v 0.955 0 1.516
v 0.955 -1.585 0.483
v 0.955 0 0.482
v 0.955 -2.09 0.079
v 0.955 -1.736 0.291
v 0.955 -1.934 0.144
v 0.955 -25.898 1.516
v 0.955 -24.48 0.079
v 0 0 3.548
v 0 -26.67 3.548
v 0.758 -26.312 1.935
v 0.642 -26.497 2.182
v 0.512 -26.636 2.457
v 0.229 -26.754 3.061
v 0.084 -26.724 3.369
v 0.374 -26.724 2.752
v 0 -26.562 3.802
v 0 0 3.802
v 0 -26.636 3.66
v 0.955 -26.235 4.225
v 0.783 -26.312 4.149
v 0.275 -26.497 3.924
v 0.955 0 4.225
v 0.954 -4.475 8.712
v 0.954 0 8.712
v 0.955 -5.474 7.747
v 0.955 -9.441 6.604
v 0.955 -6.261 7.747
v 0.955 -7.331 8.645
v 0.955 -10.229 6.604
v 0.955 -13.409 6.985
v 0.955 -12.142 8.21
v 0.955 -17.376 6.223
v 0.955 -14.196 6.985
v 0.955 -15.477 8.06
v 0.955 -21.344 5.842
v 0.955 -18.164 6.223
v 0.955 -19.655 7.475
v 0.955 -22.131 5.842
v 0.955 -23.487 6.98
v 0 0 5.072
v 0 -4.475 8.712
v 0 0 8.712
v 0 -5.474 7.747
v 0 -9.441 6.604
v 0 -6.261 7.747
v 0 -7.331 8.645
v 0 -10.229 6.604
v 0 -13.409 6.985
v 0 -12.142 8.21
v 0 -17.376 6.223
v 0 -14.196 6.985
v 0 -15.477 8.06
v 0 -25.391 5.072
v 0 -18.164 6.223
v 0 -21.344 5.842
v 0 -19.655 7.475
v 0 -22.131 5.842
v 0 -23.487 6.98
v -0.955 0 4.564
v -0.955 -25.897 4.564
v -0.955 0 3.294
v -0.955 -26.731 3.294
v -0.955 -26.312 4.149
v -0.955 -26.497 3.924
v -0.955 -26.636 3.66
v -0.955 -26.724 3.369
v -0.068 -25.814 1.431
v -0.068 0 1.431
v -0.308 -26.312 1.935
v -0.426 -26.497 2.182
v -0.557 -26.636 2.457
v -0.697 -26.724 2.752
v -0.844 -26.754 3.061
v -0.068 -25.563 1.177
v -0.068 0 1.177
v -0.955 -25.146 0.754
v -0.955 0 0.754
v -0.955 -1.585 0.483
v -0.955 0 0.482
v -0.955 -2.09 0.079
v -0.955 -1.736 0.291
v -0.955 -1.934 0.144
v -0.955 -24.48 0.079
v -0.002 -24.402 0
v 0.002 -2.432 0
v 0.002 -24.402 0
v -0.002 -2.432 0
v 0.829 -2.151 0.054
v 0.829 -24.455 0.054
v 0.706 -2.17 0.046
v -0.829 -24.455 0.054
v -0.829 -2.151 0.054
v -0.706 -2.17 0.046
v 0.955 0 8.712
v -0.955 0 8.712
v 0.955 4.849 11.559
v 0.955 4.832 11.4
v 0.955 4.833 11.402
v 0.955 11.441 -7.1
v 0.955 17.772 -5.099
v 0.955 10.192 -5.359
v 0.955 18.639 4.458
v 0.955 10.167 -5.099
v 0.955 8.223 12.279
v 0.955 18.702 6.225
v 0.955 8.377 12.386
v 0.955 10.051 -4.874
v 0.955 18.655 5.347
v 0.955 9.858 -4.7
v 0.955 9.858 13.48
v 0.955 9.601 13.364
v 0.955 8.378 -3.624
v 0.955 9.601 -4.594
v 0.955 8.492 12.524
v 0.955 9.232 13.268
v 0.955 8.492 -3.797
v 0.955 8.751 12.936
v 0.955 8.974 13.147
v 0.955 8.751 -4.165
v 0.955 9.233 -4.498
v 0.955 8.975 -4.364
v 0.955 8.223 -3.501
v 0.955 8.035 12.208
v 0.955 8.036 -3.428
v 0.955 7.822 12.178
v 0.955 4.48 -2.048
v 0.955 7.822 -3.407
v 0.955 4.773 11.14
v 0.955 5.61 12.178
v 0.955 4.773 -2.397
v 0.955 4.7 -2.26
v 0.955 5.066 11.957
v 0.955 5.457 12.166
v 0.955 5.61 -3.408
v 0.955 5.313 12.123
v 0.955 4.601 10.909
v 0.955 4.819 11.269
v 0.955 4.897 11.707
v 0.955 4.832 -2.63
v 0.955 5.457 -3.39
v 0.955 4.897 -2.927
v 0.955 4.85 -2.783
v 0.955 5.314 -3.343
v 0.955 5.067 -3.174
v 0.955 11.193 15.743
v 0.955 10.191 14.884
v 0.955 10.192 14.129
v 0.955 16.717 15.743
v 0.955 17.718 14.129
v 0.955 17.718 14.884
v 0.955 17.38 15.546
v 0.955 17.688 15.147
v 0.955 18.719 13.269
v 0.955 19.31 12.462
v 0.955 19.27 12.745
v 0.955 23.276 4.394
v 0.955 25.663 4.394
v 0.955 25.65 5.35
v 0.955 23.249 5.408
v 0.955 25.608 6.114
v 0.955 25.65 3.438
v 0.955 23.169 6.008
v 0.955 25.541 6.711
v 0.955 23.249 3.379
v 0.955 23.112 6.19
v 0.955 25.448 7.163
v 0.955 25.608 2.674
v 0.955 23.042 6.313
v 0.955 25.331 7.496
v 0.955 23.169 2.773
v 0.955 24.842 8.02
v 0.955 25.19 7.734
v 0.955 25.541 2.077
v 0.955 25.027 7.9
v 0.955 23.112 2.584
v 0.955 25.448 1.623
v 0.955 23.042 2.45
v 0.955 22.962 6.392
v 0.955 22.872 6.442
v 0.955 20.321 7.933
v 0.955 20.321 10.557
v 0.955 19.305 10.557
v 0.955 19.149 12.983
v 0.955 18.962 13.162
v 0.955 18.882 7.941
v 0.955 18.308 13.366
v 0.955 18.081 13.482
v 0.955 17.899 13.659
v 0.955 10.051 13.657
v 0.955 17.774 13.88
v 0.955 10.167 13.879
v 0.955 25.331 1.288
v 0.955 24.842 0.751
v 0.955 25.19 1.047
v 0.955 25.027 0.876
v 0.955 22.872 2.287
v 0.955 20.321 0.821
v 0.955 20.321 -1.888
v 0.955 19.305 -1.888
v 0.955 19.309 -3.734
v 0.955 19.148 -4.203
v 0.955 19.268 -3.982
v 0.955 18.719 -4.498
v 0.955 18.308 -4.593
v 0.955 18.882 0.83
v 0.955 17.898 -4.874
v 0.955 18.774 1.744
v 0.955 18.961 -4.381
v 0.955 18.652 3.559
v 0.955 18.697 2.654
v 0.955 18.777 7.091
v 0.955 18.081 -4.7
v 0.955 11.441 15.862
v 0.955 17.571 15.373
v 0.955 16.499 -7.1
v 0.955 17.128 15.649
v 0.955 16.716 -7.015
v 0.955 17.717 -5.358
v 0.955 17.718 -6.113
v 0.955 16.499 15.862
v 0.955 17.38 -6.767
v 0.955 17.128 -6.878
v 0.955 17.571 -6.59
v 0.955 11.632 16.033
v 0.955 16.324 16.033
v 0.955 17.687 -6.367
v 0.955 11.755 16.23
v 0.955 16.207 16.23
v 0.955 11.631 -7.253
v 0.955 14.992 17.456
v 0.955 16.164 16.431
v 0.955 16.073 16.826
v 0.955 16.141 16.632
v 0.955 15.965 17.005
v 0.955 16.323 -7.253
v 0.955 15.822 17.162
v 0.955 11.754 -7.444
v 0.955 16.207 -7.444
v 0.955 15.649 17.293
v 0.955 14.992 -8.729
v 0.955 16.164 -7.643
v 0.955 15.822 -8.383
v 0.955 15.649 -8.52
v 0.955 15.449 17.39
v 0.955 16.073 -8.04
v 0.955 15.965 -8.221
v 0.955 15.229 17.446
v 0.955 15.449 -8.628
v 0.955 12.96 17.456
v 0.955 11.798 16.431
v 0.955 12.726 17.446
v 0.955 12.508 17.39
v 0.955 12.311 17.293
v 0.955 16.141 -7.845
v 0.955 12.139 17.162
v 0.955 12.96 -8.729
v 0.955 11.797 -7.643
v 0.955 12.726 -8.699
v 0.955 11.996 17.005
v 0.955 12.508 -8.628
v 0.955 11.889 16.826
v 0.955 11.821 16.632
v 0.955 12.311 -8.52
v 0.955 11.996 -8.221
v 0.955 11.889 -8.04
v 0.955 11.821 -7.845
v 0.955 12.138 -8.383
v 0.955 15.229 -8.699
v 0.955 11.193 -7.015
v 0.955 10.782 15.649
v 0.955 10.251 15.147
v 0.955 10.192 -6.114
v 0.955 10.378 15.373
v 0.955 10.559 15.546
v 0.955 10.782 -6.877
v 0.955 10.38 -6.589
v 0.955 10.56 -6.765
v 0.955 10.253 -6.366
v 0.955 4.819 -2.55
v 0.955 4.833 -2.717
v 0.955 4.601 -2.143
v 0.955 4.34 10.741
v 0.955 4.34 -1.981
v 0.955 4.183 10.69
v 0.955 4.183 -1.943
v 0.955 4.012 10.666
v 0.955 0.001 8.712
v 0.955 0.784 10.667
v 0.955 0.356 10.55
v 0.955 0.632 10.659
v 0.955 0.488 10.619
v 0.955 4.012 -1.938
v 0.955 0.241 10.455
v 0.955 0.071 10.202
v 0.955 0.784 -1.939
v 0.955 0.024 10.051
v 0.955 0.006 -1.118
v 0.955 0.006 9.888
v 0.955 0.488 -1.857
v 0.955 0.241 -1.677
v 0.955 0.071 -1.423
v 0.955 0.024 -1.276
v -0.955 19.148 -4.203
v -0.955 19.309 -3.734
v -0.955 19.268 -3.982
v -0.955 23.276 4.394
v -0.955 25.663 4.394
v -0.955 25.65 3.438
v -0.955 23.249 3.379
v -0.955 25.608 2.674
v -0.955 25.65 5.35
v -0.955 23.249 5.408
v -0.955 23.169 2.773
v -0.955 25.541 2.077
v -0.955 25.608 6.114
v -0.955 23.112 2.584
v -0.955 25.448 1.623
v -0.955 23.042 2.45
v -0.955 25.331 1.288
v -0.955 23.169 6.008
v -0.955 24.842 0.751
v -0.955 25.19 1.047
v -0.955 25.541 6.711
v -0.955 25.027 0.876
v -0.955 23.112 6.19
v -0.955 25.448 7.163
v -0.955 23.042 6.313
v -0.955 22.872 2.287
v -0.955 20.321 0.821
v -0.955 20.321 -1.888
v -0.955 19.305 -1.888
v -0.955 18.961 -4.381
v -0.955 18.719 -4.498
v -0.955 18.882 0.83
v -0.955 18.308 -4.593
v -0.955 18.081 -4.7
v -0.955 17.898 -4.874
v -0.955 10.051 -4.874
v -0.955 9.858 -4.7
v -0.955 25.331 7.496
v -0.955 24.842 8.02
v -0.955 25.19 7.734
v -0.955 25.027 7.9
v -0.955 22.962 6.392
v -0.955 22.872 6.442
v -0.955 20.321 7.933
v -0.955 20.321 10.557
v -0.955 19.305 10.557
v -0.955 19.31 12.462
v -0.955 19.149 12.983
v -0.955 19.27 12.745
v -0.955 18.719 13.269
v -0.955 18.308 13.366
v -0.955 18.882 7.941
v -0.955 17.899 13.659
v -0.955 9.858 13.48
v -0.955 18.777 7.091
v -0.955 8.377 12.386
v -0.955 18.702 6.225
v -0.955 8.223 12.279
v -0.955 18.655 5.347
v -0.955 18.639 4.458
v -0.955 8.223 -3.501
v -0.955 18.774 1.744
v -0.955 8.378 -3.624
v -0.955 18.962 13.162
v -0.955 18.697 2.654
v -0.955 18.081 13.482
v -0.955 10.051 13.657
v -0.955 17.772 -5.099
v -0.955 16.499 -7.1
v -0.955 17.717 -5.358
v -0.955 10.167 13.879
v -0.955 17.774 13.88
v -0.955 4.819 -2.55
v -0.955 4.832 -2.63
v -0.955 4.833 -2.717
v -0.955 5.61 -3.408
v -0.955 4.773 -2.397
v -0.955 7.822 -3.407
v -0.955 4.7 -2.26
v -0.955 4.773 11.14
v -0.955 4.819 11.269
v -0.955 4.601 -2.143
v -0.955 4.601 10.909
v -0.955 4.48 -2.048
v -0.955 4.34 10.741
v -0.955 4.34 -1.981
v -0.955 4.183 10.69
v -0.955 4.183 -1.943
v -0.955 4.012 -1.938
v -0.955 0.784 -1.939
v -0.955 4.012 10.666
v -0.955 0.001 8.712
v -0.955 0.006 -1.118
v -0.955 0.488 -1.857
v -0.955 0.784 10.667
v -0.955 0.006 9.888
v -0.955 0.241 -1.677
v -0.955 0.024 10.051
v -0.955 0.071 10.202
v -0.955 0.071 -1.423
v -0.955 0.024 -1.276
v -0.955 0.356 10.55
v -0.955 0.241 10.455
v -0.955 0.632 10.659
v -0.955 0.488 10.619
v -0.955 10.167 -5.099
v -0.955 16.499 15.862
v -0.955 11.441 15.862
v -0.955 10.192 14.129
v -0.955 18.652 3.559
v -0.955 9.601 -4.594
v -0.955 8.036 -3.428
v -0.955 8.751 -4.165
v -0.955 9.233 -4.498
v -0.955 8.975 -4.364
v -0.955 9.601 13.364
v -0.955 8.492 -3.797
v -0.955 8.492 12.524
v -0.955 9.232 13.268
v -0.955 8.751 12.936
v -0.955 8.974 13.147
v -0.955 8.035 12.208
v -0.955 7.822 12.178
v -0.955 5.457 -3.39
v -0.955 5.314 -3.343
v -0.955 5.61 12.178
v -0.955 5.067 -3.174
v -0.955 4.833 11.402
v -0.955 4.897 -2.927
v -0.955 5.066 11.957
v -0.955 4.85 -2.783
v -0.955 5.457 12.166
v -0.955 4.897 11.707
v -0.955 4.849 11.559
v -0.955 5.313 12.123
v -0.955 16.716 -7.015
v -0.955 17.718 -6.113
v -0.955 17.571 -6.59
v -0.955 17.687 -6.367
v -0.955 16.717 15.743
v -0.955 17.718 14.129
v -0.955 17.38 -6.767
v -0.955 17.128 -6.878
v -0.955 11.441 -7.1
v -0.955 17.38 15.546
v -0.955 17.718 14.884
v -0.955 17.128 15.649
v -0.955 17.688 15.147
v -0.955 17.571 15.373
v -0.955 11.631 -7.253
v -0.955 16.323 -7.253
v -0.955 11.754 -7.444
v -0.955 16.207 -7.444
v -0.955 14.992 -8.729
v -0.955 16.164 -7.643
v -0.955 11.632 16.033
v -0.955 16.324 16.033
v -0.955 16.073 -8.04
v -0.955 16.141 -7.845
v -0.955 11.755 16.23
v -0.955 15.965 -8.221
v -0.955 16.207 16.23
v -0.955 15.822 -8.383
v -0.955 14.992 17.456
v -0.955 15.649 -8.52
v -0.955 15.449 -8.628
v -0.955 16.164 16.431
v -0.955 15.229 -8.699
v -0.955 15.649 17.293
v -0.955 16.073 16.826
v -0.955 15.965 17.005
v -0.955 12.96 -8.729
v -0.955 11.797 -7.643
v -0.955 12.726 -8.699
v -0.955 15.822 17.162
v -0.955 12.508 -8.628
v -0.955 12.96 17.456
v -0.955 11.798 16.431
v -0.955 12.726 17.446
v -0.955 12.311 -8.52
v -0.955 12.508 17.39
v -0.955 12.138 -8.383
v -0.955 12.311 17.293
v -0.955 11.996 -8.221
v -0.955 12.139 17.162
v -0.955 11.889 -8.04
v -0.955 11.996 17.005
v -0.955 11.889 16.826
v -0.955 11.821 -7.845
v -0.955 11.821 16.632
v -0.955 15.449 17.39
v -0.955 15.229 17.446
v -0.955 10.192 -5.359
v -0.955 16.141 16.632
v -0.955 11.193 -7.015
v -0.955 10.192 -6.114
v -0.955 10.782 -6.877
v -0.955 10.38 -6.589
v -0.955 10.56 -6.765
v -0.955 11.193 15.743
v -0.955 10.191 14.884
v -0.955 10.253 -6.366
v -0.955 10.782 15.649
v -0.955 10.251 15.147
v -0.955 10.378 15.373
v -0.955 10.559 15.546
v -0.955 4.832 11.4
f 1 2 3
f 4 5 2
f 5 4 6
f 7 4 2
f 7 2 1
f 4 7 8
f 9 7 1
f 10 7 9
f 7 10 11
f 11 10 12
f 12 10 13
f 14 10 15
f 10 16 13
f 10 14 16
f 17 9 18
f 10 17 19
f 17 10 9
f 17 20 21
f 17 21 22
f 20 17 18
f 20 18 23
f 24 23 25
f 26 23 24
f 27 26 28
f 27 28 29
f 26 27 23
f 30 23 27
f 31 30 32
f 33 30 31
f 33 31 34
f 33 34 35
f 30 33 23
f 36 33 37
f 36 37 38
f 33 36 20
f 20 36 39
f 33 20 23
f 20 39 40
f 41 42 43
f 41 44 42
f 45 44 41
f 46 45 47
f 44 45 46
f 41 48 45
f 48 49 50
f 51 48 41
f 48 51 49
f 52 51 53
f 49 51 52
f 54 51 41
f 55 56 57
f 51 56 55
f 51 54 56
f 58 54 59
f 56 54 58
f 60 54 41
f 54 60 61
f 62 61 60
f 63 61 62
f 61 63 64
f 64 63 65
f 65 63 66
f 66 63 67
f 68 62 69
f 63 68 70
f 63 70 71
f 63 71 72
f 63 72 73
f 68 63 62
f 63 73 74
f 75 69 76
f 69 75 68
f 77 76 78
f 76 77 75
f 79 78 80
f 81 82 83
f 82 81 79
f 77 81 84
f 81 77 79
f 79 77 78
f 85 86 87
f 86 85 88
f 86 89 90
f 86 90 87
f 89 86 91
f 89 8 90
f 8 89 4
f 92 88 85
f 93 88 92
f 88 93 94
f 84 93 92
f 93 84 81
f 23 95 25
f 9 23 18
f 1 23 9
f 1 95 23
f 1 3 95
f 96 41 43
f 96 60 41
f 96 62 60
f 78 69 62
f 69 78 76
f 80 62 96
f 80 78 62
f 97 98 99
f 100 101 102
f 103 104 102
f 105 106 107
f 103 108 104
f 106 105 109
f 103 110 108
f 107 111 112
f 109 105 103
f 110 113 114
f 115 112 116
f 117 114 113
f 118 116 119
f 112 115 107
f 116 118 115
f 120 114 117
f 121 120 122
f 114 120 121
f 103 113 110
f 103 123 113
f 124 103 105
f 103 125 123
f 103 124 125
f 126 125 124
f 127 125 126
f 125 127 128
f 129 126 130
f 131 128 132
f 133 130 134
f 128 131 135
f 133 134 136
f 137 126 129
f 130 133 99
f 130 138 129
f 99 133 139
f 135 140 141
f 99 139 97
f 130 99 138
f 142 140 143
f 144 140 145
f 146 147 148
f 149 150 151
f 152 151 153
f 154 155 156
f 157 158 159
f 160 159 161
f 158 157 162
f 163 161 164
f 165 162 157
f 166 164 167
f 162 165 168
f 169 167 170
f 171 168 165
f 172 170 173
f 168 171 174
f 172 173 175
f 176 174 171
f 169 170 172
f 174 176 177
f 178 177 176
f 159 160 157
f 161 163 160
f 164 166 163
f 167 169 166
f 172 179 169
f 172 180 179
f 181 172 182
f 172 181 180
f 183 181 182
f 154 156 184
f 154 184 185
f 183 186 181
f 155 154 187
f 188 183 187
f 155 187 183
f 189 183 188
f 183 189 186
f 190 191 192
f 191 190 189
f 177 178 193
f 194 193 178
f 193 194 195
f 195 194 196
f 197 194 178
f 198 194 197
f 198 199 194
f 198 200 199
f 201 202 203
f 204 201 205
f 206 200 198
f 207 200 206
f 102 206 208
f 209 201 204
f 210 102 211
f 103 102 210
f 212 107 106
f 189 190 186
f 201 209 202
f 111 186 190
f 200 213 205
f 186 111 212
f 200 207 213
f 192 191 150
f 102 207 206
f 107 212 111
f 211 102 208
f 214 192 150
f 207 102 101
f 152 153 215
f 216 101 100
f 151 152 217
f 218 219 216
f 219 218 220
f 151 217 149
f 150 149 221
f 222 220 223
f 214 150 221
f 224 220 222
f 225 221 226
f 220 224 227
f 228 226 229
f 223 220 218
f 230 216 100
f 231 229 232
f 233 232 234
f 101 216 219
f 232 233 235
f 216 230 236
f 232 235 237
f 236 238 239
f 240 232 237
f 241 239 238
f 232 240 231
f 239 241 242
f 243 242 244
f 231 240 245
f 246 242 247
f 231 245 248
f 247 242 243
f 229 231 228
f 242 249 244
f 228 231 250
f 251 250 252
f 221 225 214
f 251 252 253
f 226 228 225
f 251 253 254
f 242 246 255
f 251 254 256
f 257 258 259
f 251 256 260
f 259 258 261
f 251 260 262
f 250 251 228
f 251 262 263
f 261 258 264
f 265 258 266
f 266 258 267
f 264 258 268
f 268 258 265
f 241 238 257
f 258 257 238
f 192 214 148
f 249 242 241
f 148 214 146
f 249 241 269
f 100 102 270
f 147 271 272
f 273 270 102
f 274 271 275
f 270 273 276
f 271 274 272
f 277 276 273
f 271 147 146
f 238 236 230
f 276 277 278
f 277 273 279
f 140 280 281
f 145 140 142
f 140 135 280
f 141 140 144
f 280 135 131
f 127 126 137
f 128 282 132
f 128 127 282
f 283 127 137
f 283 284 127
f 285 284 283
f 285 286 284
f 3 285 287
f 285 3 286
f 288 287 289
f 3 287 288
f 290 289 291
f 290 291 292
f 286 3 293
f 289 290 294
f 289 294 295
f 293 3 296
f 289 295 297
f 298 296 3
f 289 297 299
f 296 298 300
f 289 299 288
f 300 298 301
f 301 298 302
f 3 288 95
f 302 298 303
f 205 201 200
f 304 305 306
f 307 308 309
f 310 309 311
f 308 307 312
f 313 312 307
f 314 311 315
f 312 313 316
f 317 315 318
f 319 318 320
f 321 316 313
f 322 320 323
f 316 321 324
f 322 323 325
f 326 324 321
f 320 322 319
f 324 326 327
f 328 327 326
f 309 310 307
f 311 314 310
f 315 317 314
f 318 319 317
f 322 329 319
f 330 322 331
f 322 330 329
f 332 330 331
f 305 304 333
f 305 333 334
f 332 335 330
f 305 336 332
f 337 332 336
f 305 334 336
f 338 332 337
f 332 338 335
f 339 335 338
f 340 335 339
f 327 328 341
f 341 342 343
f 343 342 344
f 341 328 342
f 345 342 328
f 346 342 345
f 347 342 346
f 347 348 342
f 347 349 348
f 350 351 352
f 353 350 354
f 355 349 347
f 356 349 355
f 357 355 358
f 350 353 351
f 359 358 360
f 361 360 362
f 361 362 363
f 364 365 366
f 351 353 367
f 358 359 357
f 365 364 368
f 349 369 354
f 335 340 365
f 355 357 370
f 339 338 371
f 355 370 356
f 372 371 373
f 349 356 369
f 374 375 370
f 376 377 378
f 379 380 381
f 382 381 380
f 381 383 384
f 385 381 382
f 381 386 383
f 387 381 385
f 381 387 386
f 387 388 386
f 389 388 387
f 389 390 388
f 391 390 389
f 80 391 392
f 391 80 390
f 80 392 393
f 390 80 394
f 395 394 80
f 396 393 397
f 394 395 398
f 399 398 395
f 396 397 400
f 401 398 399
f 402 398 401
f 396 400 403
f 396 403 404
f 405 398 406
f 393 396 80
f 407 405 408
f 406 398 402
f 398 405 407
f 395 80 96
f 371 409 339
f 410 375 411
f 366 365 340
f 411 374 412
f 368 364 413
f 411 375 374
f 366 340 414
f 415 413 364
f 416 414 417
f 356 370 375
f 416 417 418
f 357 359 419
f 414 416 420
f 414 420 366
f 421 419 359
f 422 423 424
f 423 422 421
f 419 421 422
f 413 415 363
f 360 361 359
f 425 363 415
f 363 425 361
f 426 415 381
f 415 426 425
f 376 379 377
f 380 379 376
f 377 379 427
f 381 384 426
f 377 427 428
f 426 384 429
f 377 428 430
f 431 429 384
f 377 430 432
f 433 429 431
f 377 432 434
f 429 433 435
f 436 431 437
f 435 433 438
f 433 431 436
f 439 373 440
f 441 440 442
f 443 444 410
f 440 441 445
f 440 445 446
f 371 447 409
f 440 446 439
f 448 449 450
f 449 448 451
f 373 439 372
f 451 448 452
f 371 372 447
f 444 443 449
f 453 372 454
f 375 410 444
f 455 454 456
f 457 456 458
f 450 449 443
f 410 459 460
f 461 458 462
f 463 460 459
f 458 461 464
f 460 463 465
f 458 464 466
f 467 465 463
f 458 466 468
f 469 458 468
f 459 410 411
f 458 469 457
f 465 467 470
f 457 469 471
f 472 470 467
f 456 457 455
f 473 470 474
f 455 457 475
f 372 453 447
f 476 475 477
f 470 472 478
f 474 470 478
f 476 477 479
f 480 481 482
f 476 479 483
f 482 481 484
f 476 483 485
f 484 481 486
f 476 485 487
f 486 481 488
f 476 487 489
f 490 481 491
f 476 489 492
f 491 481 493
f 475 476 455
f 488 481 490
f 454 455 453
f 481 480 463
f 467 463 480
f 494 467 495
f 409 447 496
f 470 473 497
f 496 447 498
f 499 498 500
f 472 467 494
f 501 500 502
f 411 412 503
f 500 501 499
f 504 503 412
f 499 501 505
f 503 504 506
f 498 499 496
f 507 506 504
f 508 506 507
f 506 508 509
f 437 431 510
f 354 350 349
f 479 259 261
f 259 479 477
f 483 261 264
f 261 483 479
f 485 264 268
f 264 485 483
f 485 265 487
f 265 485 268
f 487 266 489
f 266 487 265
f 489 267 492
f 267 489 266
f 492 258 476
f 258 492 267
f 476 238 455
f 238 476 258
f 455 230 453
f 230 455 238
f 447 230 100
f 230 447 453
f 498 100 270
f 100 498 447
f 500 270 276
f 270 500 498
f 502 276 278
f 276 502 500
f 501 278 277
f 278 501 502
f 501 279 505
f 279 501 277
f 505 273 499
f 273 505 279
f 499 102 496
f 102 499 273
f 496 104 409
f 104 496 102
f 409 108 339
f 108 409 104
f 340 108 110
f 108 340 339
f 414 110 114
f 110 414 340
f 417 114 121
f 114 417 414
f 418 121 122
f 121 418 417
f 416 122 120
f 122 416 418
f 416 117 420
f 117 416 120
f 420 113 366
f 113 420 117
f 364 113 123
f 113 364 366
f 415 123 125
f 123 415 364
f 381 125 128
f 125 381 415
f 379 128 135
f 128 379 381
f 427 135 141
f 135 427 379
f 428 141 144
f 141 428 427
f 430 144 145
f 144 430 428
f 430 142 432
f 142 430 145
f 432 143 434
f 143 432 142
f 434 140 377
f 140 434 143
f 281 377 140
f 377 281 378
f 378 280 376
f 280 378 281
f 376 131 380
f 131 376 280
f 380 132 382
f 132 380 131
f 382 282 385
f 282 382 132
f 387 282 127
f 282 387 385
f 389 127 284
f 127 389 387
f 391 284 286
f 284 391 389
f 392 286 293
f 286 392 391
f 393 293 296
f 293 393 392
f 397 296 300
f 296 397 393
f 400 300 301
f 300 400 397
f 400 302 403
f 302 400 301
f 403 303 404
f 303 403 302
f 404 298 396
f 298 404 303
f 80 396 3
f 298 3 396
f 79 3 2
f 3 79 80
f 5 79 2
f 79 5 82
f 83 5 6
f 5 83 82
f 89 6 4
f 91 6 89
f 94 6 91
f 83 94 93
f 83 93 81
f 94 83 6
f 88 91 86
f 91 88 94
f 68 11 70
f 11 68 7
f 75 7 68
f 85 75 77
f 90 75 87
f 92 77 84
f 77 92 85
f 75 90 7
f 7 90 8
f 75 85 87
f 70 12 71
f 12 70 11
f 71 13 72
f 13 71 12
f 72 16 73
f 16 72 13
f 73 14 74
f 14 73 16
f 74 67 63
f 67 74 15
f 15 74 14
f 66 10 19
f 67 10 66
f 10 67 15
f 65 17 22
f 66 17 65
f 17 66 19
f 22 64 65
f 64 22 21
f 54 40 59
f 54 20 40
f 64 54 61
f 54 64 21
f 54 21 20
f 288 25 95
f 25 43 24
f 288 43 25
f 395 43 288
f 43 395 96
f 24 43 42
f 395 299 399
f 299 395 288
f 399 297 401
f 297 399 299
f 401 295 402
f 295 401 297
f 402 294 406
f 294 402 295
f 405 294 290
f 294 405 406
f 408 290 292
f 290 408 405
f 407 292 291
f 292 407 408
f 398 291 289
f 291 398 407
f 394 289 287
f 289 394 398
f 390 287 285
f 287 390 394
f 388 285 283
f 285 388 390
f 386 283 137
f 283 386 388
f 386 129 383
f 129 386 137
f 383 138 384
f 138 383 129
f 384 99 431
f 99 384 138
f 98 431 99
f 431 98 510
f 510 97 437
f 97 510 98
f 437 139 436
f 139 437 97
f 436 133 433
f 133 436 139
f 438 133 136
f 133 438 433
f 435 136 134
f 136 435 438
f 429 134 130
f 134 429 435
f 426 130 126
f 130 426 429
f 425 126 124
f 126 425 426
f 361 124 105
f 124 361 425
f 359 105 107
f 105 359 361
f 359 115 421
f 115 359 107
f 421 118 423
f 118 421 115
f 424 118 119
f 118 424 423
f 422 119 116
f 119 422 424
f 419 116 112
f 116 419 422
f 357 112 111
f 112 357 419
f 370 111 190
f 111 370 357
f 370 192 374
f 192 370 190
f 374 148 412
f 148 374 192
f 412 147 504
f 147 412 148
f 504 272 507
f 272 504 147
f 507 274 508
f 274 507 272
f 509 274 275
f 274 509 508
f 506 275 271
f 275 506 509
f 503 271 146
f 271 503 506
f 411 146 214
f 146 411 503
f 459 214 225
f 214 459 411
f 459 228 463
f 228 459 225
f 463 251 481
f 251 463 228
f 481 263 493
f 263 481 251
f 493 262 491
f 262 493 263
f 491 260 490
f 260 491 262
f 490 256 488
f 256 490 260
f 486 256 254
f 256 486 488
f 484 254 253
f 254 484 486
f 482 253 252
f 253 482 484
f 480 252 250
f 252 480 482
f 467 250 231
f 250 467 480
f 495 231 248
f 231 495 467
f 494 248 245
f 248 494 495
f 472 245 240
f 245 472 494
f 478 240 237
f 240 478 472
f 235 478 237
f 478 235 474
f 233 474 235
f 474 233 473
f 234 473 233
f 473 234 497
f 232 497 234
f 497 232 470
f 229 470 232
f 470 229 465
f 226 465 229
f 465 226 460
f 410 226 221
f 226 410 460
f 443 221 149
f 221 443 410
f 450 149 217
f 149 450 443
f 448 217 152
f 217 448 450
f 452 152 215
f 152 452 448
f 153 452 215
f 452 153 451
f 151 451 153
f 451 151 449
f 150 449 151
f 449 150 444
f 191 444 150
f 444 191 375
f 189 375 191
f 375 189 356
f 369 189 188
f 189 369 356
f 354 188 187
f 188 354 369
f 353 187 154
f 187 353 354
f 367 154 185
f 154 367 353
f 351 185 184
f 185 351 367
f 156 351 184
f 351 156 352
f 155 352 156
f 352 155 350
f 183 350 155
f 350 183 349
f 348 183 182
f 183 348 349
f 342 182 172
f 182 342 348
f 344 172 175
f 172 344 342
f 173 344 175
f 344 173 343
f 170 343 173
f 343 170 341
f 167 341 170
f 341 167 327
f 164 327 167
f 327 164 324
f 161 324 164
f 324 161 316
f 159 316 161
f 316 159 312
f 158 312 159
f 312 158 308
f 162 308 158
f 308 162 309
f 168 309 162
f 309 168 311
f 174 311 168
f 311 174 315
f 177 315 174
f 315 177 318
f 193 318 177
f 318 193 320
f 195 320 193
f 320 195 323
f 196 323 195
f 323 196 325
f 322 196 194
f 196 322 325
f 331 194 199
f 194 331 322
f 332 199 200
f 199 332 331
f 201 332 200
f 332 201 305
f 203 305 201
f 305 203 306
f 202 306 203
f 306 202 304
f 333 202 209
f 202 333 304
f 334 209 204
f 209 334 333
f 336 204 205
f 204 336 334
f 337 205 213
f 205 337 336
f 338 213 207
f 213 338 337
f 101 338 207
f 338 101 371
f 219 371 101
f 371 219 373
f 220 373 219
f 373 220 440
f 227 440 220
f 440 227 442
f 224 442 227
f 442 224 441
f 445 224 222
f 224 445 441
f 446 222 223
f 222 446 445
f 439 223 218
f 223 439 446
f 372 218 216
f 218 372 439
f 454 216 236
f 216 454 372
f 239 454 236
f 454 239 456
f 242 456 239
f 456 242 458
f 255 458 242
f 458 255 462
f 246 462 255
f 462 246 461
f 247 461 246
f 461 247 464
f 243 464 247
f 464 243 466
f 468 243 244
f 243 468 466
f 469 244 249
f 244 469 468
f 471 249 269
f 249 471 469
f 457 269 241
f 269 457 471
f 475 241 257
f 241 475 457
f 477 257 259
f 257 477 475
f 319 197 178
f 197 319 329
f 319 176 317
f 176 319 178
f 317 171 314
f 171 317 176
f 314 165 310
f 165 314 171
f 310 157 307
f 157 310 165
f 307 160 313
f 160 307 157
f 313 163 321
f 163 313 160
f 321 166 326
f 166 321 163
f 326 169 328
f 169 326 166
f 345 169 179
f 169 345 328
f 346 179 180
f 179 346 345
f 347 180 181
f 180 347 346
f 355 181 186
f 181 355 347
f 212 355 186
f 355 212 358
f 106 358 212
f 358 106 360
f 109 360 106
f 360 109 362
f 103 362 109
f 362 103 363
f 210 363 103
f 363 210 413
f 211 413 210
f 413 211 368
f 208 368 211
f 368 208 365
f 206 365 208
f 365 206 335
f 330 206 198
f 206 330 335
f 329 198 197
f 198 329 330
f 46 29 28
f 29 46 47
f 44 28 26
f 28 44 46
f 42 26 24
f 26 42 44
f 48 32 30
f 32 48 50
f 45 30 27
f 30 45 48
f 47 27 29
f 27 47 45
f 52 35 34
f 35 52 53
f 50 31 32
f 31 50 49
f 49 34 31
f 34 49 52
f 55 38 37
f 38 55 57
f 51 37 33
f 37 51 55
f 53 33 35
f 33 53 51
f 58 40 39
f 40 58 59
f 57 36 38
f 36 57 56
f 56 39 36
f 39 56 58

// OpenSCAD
// file: keygen.scad
$inf=1000;
$eps=.01;

function key_move(points, offset) = [
    for(p=points) [p[0] + offset[0],
                   p[1] + offset[1]]
];

module key_outline(outline_points, thickness, outline_paths=undef) {
    rotate(-90, [0, 1, 0]) rotate(-90, [0, 0, 1]) // Rotate into the correct plane
        linear_extrude(height=thickness, center=true) // Extrude the key outline
            polygon(points=outline_points, paths=outline_paths); // Draw the outline
}

module key_blade(warding, plug_diameter=0) {
    // Draw the blade to infinity in Y
    // optionally intersected with the plug cylinder
    // to round the bottom
    intersection() {
        rotate(90, [1, 0, 0])
            linear_extrude(height=2*$inf, center=true)
                polygon(warding);

        // Draw the plug, if a plug diameter is specified
        if(plug_diameter > 0) {
            // Draw infinite cylinder in -Y
            translate([0, 0, 0.5*plug_diameter]) rotate(90, [1, 0, 0])
                cylinder(r=0.5*plug_diameter, h=$inf, center=true, $fn=$fn ? 4*$fn : 48);
        }
    }
}

module key_x_line(length) {
    // Hack to draw a line in X
    // since OpenSCAD does not support line primitives
    // Take a 2D square and rotate it
    // When it is orthogonal to the XY plane,
    // it projects down to a line
    rotate(90, [1, 0, 0])
    square([length, length], center=true);
}

module key_warding_cutter(warding, blade_height, cutter_radius, left) {
    neg = left ? -1 : 1;
    translate([neg * -cutter_radius, 0, 0])
        rotate_extrude($fn=$fn ? 4*$fn : 48)
            translate([neg * cutter_radius, 0])
                difference() {
                    translate([0, 0.5*blade_height])
                        square([2 * cutter_radius, blade_height], center=true);
                    minkowski() {
                        translate([neg * 1.5 * cutter_radius, 0])
                            key_x_line(3 * cutter_radius);
                        polygon(warding);
                    }
                    polygon(warding);
                }
}

module key_engrave(engrave_points, engrave_depth, left, thickness, engrave_paths=undef) {
    translate([(left ? -1 : 1) * 0.5*thickness, 0, 0]) rotate(-90, [0, 1, 0]) rotate(-90, [0, 0, 1]) // Translate and rotate into the correct soot
        linear_extrude(height=2*engrave_depth, center=true) // Extrude the key outline
            polygon(points=engrave_points, paths=engrave_paths); // Draw the outline
}

module key_blank(outline_points,
                warding,
                outline_paths=undef,
                engrave_right_points=[],
                engrave_right_paths=undef,
                engrave_left_points=[],
                engrave_left_paths=undef,
                bow_thickness=0,
                engrave_depth=.1,
                plug_diameter=0,
                offset=[0, 0],
                cutter_radius=18,
                milling_offset=0) {

    // Find the bounding box of the warding
    warding_min = [min([for(e=warding) e[0]]), min([for(e=warding) e[1]])];
    warding_max = [max([for(e=warding) e[0]]), max([for(e=warding) e[1]])];

    // Apply the given offset to the outline,
    // holes, and engrave
    outline_adj = key_move(outline_points, offset);
    engrave_left_adj = key_move(engrave_left_points, offset);
    engrave_right_adj = key_move(engrave_right_points, offset);

    // Move the warding profile
    // so that it is centered in X
    // and non-negative in Y
    warding_offset = [-0.5 * (warding_min[0] + warding_max[0]),
                      -warding_min[1]];
    warding_adj = key_move(warding, warding_offset);

    // Infer various key properties
    thickness = (bow_thickness == 0) ? abs(warding_max[0] - warding_min[0]) : bow_thickness;
    blade_height = abs(warding_max[1] - warding_min[1]);

    // Cut out the warding milling artifacts
    // from the bow
    difference() {
        // Create the bulk of the keyblank
        // by intersecting the outline
        // with the warding profile
        // and the plug
        intersection() {
            // Draw the key outline and holes
            key_outline(outline_adj, thickness, outline_paths);
            
            // Draw the blade, and a giant box where the bow is
            // so that we don't wipe out the bow
            // when the intersection happens
            union() {
                // Fill +Y half-space
                translate([0, $inf/2+milling_offset, 0])
                    cube([$inf, $inf, $inf], center=true);

                key_blade(warding_adj, plug_diameter);
            }
        }
        // Draw the milling wheels that cut the warding
        if(cutter_radius != 0) {
            translate([0, milling_offset, 0])
                union() {
                    key_warding_cutter(warding_adj, blade_height, cutter_radius, false);
                    key_warding_cutter(warding_adj, blade_height, cutter_radius, true);
                }
        }

        // Draw the engraveing
        key_engrave(engrave_right_adj, engrave_depth, false, thickness, engrave_right_paths);
        key_engrave(engrave_left_adj, engrave_depth, true, thickness, engrave_left_paths);
    }
}

function key_code_to_heights(code, depth_table) = [for(i=key_enum(code)) depth_table[search(code[i], "0123456789")[0]]];

module key_bitting_cutter(flat, angle, tool_height) {
    polygon([[-0.5 * flat, 0],
            [0.5 * flat, 0],
            [0.5 * flat + tan(0.5 * angle) * tool_height, tool_height],
            [0.5 * flat - tan(0.5 * angle) * tool_height, tool_height]]);
}

module key_bitting(heights,
                   locations,
                   flat,
                   angle=100,
                   cutter_width=5,
                   cutter_height=5) {
    // Rotate the cutting tool to the proper orientation
    rotate(-90, [0, 0, 1]) rotate(90, [1, 0, 0])
        // Union together a handful of trapezoids
        // that comprise the cuts
        union() {
            for(i=key_enum(heights)) {
                // Move to the proper location and height
                translate([locations[i], heights[i]])
                    linear_extrude(height=cutter_width, center=true)
                        key_bitting_cutter(flat, angle, cutter_height);
            }
        }
}

function key_lkup(ks, vs, k) = vs[search([k], [for(ki=ks) [ki]])[0]];
    
function key_enum(l) = len(l) > 0 ? [for(i=[0:len(l)-1]) i] : [];
// main file
use <keygen.scad>
include <schlage.gen.scad>

module schlage_classic(bitting="",
                       outline_name="5pin",
                       warding_name="c") {

    outlines_k = ["5pin",
                  "6pin"];
    outlines_v = [[outline_5pin_points, outline_5pin_paths,
                   [-outline_5pin_points[92][0], -outline_5pin_points[98][1]],
                   engrave_5pin_points,
                   engrave_5pin_paths],
                  [outline_6pin_points, outline_6pin_paths,
                   [-outline_6pin_points[92][0], -outline_6pin_points[98][1]],
                   engrave_6pin_points,
                   engrave_6pin_paths]];
    wardings_k = ["c",
                  "ce",
                  "e",
                  "ef",
                  "f",
                  "fg",
                  "h",
                  "j",
                  "k",    
                  "l"];
    wardings_v = [warding_c_points,
                  warding_ce_points,
                  warding_e_points,
                  warding_ef_points,
                  warding_f_points,
                  warding_fg_points,
                  warding_h_points,
                  warding_j_points,
                  warding_k_points,
                  warding_l_points];

    outline_param = key_lkup(outlines_k, outlines_v, outline_name);
    outline_points = outline_param[0];
    outline_paths = outline_param[1];
    offset = outline_param[2];
    engrave_points = outline_param[3];
    engrave_paths = outline_param[4];

    warding_points = key_lkup(wardings_k, wardings_v, warding_name);
    
    cut_locations = [for(i=[.231, .3872, .5434, .6996, .8558, 1.012]) i*25.4];
    depth_table = [for(i=[0.335:-0.015:0.199]) i*25.4];

    heights = key_code_to_heights(bitting, depth_table);

    difference() {
        key_blank(outline_points,
                  warding_points,
                  outline_paths=outline_paths,
                  engrave_right_points=engrave_points,
                  engrave_right_paths=engrave_paths,
                  engrave_left_points=engrave_points,
                  engrave_left_paths=engrave_paths,
                  offset=offset,
                  plug_diameter=12.7);
        key_bitting(heights, cut_locations, .7874);
    }
}

schlage_classic("25467");
